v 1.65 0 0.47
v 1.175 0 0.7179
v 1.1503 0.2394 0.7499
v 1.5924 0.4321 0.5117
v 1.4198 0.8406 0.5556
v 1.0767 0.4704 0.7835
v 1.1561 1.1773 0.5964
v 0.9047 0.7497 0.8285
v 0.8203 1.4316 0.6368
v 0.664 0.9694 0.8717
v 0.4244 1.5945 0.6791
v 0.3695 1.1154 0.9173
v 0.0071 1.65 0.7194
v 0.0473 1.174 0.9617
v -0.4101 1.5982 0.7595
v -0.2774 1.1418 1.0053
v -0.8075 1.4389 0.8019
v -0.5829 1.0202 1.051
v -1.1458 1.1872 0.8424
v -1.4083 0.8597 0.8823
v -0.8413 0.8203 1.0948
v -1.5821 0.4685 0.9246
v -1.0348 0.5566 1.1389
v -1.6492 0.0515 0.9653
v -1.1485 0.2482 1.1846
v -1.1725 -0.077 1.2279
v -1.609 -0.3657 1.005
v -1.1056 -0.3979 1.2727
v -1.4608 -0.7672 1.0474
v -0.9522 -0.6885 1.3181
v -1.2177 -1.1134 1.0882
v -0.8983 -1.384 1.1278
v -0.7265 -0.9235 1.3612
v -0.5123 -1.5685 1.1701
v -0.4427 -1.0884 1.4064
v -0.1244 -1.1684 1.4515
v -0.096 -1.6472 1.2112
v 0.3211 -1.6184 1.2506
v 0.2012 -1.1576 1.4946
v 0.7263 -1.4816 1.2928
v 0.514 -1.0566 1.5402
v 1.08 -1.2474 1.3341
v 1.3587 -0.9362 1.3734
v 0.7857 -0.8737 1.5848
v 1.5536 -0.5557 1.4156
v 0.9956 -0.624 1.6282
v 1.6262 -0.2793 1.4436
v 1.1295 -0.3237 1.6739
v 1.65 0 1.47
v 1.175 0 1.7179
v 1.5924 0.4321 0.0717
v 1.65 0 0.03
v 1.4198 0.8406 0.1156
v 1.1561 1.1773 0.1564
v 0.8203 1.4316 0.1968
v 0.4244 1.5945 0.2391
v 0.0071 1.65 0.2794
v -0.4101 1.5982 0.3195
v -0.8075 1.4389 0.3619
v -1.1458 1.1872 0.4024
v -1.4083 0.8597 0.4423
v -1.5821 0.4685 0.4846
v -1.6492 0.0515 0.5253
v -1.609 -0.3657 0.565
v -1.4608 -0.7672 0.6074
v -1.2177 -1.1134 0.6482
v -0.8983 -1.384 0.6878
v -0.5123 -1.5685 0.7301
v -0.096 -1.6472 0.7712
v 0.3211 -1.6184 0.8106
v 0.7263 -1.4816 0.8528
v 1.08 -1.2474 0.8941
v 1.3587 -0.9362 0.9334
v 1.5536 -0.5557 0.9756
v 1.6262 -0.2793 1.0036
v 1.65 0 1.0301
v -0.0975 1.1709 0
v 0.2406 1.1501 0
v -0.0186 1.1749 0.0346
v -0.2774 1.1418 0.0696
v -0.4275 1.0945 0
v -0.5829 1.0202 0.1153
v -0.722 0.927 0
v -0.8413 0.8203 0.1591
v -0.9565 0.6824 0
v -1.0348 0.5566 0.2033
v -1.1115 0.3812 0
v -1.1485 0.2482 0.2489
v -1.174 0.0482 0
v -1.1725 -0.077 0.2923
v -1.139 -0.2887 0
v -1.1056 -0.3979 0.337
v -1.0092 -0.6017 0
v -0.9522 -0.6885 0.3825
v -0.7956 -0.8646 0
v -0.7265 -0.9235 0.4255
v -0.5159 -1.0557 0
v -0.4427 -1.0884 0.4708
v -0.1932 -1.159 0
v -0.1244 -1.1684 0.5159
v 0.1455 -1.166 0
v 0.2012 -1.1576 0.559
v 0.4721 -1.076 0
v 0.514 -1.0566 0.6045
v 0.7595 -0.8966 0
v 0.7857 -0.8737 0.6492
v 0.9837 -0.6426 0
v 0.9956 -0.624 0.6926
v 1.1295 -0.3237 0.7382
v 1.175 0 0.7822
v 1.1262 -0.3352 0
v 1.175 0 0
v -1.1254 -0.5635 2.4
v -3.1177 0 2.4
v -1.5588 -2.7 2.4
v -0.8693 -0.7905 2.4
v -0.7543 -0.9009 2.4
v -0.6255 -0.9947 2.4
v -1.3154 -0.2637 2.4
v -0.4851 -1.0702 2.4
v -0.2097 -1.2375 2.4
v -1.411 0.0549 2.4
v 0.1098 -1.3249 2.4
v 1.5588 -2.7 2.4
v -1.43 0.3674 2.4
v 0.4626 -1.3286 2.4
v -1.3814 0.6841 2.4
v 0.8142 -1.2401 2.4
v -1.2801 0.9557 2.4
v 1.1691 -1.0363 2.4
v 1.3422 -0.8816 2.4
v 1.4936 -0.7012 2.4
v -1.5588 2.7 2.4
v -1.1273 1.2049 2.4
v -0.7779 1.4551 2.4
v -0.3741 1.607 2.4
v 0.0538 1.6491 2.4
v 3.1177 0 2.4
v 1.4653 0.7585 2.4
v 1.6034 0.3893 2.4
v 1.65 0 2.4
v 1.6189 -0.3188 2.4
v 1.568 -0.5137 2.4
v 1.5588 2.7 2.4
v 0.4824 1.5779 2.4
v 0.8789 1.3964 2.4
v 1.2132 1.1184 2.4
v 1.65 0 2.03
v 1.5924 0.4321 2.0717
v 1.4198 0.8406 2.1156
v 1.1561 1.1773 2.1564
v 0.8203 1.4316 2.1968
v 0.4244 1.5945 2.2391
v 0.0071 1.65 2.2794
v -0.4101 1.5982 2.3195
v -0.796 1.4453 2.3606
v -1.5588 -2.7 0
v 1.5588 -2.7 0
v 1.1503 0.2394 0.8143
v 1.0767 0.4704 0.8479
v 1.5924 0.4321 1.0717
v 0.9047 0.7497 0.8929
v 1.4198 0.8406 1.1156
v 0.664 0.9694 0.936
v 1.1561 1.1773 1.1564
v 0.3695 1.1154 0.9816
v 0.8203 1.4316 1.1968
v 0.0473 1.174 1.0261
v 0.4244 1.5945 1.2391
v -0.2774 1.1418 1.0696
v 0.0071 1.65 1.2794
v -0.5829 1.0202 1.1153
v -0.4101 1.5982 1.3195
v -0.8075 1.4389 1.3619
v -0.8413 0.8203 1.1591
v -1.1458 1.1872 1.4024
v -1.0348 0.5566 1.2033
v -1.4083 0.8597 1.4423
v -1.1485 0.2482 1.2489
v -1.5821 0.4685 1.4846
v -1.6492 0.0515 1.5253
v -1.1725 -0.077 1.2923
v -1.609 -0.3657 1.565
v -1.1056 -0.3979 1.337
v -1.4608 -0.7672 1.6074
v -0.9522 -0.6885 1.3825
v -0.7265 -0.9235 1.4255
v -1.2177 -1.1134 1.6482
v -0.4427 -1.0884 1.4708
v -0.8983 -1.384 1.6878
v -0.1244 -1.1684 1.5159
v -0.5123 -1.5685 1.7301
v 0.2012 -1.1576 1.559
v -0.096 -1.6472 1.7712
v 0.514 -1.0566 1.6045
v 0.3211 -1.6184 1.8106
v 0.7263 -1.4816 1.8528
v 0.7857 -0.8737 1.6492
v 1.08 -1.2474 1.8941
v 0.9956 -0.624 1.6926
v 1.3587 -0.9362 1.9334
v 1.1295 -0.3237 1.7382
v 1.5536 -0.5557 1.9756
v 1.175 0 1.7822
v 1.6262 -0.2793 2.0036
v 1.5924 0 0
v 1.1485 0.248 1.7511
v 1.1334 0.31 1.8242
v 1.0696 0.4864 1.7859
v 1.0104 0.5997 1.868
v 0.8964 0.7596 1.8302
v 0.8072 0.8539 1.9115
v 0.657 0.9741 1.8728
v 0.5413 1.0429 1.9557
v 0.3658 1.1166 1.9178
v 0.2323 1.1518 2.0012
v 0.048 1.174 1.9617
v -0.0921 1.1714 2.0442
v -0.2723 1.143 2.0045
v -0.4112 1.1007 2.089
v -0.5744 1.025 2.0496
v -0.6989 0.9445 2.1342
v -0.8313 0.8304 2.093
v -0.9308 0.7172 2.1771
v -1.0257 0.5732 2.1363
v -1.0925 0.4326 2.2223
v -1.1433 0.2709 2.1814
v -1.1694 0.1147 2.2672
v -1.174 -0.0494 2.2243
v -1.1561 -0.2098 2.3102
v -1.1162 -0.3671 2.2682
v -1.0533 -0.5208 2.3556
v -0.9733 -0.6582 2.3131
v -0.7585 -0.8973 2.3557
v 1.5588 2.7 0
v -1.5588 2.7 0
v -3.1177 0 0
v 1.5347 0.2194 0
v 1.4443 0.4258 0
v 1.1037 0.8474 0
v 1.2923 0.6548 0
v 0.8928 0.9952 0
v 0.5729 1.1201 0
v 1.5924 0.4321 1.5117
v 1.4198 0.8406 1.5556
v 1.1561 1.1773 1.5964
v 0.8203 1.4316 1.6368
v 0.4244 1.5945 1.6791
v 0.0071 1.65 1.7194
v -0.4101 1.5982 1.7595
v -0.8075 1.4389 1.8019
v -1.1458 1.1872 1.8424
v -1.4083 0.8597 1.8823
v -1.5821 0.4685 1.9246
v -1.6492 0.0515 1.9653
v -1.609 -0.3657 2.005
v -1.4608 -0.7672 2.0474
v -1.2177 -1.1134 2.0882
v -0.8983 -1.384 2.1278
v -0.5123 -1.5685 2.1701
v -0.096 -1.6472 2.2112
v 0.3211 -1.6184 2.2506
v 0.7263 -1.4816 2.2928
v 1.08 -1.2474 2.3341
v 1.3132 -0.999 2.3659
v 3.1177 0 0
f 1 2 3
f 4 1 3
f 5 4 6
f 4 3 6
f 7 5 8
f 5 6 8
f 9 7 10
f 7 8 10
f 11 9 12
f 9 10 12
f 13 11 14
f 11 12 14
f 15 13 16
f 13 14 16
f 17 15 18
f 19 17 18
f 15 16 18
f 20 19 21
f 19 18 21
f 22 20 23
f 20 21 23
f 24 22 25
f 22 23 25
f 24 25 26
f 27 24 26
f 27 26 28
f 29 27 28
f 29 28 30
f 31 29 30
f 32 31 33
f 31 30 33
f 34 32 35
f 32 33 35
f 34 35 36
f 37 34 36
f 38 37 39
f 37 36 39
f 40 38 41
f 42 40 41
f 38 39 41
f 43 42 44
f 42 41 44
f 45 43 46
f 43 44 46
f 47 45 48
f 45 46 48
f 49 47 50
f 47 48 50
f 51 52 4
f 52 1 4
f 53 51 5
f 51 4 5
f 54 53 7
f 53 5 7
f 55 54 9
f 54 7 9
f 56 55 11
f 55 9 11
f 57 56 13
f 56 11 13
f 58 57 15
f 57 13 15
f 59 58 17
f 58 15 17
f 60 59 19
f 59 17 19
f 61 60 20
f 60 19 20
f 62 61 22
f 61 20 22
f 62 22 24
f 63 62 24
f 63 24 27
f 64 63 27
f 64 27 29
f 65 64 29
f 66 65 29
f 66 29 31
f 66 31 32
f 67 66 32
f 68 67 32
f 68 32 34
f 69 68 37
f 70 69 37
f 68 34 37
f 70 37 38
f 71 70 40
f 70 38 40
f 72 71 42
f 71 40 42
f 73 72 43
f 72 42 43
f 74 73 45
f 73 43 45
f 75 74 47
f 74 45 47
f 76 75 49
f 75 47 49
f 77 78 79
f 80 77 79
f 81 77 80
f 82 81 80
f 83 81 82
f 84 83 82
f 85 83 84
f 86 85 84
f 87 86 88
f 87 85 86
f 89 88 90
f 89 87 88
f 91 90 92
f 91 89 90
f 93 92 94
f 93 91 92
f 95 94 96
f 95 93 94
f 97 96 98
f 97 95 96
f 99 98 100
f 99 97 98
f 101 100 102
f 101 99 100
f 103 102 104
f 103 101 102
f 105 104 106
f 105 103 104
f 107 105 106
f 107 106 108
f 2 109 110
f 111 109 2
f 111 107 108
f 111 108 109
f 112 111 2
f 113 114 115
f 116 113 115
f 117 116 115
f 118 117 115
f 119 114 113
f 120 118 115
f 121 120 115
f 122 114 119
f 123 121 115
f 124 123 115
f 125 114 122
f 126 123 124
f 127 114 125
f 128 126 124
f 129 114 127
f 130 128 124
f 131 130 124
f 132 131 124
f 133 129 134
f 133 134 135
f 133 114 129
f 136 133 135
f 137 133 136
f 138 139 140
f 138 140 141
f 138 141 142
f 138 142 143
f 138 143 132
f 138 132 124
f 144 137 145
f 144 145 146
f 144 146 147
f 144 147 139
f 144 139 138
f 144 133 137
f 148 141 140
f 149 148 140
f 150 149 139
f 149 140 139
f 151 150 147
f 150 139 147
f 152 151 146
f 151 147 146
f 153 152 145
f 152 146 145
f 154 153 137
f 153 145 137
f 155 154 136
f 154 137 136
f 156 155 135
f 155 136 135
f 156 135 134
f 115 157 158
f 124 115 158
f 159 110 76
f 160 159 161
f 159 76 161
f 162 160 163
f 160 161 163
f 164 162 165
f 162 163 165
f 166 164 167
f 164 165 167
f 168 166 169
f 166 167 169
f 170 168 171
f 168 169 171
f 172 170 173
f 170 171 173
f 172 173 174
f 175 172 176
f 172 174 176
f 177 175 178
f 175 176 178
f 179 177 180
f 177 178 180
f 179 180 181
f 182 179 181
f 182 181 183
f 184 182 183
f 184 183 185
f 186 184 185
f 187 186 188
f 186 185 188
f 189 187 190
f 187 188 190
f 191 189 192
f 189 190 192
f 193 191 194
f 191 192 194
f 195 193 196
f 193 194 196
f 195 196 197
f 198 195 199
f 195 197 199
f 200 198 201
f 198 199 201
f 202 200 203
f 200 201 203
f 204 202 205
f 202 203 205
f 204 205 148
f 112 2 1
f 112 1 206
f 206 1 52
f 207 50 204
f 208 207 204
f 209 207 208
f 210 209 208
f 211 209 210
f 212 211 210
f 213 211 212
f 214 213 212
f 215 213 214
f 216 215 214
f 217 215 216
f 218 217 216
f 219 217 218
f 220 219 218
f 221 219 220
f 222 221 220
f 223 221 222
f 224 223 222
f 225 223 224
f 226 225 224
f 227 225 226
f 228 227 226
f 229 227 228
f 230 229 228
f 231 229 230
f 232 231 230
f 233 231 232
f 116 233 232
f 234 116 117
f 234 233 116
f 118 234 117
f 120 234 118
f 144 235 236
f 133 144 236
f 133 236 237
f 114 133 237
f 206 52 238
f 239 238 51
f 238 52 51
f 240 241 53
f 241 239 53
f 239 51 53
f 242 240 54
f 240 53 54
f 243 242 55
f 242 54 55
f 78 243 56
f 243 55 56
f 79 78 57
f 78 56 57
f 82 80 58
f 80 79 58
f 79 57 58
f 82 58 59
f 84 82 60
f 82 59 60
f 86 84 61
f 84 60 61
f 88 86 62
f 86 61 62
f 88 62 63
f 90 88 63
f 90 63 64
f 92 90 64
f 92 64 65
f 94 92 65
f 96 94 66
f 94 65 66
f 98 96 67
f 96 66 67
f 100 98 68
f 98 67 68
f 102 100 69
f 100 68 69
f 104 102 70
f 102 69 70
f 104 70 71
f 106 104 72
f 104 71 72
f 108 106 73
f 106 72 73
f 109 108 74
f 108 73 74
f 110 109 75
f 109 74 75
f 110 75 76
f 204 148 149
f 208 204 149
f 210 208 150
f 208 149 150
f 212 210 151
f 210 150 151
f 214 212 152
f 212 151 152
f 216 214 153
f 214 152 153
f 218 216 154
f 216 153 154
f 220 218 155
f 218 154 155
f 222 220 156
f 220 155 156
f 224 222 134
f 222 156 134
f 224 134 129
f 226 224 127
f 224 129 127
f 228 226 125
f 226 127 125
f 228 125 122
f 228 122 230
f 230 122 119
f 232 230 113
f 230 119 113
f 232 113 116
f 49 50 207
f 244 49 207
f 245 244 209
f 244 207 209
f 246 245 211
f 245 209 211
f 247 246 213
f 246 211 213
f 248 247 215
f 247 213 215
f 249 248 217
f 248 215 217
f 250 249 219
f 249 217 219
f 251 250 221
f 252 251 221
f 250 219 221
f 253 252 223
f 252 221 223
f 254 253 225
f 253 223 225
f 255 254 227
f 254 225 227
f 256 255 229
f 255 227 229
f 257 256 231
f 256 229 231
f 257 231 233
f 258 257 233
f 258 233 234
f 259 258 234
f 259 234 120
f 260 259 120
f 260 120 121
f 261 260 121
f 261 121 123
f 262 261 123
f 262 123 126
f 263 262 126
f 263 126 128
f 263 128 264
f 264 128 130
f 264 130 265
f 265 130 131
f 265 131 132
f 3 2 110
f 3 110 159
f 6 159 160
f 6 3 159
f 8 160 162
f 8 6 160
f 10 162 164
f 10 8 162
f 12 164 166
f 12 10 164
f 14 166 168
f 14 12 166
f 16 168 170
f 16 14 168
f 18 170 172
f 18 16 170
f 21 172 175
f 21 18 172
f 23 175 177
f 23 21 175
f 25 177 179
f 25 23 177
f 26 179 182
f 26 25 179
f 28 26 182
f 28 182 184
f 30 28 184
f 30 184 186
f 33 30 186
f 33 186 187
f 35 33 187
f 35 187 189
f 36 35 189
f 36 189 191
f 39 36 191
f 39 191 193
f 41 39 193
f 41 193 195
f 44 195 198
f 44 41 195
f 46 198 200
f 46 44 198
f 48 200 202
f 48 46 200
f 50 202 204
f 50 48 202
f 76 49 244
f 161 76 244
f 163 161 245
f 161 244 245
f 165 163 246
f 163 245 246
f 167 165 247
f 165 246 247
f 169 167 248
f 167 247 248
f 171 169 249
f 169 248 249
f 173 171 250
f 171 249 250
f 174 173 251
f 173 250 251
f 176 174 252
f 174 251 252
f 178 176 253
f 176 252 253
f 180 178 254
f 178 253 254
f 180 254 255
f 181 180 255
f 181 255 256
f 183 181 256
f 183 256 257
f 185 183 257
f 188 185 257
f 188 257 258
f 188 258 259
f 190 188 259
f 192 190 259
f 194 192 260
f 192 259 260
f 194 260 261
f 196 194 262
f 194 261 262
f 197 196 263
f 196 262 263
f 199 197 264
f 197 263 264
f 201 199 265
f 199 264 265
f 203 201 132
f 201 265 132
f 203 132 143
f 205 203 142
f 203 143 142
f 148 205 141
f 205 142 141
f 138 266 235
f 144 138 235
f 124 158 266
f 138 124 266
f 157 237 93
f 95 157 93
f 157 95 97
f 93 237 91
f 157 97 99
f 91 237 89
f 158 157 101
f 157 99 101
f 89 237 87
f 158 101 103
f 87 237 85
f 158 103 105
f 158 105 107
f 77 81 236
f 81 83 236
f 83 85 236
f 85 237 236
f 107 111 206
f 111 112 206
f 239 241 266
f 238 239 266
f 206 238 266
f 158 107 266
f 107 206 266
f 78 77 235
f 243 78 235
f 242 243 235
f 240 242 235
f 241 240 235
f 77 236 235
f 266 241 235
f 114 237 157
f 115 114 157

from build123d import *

# Parameters (mm, degrees)
SKETCH1_R                       = 1.175
PRINTED_NUT_AF5P4_H2P4_DEPTH    = 2.4
ACTUAL_MATCHING_FEMALE_P1_PITCH = 1


with BuildPart() as part:
    # Sketch1 → Printed_nut_AF5p4_H2p4 (new body)
    with BuildSketch(Plane.XY):
        Polygon((3.117691454, 0), (1.558845727, 2.7), (-1.558845727, 2.7), (-3.117691454, 0), (-1.558845727, -2.7), (1.558845727, -2.7), align=None)
        Circle(SKETCH1_R, mode=Mode.SUBTRACT)
    extrude(amount=PRINTED_NUT_AF5P4_H2P4_DEPTH)

    # Actual_matching_female_P1: the profile of 3DSketch1 screwed along a right-hand helix of 3 turns, 8 arcs to a turn; built about Z, then put on its axis
    actual_matching_female_p1_z = Axis((0, 0, 0), (0, 0, 1))
    actual_matching_female_p1_corners = [(1.075, 0, -0.52), (1.65, 0, -0.22), (1.65, 0, 0.22), (1.075, 0, 0.52)]
    with BuildLine(mode=Mode.PRIVATE) as actual_matching_female_p1_profile:
        Line(actual_matching_female_p1_corners[0], actual_matching_female_p1_corners[1])
        Line(actual_matching_female_p1_corners[1], actual_matching_female_p1_corners[2])
        Line(actual_matching_female_p1_corners[2], actual_matching_female_p1_corners[3])
        Line(actual_matching_female_p1_corners[3], actual_matching_female_p1_corners[0])
    actual_matching_female_p1_cap = Face(actual_matching_female_p1_profile.wire())
    actual_matching_female_p1_turn_angles = [0, 22.5, 45, 67.5, 90, 112.5, 135, 157.5, 180, 202.5, 225, 247.5, 270, 292.5, 315, 337.5, 360]
    actual_matching_female_p1_turn_weights = [1, 0.9238795325112867, 1, 0.9238795325112867, 1, 0.9238795325112867, 1, 0.9238795325112867, 1, 0.9238795325112867, 1, 0.9238795325112867, 1, 0.9238795325112867, 1, 0.9238795325112867, 1]
    actual_matching_female_p1_turn_rails = [Edge.make_bspline([Vector(p[0], p[1], 0).rotate(actual_matching_female_p1_z, actual_matching_female_p1_turn_angles[k]) / actual_matching_female_p1_turn_weights[k] + Vector(0, 0, p[2] + ACTUAL_MATCHING_FEMALE_P1_PITCH * actual_matching_female_p1_turn_angles[k] / 360) for k in range(17)], [0, 0, 0, 1, 1, 2, 2, 3, 3, 4, 4, 5, 5, 6, 6, 7, 7, 8, 8, 8], 2, actual_matching_female_p1_turn_weights) for p in actual_matching_female_p1_corners]
    actual_matching_female_p1_turn_sides = [Face.make_surface_from_curves(actual_matching_female_p1_turn_rails[p[0]], actual_matching_female_p1_turn_rails[p[1]]) for p in [(0, 1), (1, 2), (2, 3), (3, 0)]]
    actual_matching_female_p1 = Plane(origin=(0, 0, 0.25005), x_dir=(1, 0, 0), z_dir=(0, 0, 1)) * Solid(Shell([*[p.moved(Location((0, 0, ACTUAL_MATCHING_FEMALE_P1_PITCH * i))) for i in range(3) for p in actual_matching_female_p1_turn_sides], actual_matching_female_p1_cap, actual_matching_female_p1_cap.rotate(actual_matching_female_p1_z, 1080).moved(Location((0, 0, ACTUAL_MATCHING_FEMALE_P1_PITCH * 1080 / 360)))]))
    add(actual_matching_female_p1, mode=Mode.SUBTRACT)


solid = part.part
